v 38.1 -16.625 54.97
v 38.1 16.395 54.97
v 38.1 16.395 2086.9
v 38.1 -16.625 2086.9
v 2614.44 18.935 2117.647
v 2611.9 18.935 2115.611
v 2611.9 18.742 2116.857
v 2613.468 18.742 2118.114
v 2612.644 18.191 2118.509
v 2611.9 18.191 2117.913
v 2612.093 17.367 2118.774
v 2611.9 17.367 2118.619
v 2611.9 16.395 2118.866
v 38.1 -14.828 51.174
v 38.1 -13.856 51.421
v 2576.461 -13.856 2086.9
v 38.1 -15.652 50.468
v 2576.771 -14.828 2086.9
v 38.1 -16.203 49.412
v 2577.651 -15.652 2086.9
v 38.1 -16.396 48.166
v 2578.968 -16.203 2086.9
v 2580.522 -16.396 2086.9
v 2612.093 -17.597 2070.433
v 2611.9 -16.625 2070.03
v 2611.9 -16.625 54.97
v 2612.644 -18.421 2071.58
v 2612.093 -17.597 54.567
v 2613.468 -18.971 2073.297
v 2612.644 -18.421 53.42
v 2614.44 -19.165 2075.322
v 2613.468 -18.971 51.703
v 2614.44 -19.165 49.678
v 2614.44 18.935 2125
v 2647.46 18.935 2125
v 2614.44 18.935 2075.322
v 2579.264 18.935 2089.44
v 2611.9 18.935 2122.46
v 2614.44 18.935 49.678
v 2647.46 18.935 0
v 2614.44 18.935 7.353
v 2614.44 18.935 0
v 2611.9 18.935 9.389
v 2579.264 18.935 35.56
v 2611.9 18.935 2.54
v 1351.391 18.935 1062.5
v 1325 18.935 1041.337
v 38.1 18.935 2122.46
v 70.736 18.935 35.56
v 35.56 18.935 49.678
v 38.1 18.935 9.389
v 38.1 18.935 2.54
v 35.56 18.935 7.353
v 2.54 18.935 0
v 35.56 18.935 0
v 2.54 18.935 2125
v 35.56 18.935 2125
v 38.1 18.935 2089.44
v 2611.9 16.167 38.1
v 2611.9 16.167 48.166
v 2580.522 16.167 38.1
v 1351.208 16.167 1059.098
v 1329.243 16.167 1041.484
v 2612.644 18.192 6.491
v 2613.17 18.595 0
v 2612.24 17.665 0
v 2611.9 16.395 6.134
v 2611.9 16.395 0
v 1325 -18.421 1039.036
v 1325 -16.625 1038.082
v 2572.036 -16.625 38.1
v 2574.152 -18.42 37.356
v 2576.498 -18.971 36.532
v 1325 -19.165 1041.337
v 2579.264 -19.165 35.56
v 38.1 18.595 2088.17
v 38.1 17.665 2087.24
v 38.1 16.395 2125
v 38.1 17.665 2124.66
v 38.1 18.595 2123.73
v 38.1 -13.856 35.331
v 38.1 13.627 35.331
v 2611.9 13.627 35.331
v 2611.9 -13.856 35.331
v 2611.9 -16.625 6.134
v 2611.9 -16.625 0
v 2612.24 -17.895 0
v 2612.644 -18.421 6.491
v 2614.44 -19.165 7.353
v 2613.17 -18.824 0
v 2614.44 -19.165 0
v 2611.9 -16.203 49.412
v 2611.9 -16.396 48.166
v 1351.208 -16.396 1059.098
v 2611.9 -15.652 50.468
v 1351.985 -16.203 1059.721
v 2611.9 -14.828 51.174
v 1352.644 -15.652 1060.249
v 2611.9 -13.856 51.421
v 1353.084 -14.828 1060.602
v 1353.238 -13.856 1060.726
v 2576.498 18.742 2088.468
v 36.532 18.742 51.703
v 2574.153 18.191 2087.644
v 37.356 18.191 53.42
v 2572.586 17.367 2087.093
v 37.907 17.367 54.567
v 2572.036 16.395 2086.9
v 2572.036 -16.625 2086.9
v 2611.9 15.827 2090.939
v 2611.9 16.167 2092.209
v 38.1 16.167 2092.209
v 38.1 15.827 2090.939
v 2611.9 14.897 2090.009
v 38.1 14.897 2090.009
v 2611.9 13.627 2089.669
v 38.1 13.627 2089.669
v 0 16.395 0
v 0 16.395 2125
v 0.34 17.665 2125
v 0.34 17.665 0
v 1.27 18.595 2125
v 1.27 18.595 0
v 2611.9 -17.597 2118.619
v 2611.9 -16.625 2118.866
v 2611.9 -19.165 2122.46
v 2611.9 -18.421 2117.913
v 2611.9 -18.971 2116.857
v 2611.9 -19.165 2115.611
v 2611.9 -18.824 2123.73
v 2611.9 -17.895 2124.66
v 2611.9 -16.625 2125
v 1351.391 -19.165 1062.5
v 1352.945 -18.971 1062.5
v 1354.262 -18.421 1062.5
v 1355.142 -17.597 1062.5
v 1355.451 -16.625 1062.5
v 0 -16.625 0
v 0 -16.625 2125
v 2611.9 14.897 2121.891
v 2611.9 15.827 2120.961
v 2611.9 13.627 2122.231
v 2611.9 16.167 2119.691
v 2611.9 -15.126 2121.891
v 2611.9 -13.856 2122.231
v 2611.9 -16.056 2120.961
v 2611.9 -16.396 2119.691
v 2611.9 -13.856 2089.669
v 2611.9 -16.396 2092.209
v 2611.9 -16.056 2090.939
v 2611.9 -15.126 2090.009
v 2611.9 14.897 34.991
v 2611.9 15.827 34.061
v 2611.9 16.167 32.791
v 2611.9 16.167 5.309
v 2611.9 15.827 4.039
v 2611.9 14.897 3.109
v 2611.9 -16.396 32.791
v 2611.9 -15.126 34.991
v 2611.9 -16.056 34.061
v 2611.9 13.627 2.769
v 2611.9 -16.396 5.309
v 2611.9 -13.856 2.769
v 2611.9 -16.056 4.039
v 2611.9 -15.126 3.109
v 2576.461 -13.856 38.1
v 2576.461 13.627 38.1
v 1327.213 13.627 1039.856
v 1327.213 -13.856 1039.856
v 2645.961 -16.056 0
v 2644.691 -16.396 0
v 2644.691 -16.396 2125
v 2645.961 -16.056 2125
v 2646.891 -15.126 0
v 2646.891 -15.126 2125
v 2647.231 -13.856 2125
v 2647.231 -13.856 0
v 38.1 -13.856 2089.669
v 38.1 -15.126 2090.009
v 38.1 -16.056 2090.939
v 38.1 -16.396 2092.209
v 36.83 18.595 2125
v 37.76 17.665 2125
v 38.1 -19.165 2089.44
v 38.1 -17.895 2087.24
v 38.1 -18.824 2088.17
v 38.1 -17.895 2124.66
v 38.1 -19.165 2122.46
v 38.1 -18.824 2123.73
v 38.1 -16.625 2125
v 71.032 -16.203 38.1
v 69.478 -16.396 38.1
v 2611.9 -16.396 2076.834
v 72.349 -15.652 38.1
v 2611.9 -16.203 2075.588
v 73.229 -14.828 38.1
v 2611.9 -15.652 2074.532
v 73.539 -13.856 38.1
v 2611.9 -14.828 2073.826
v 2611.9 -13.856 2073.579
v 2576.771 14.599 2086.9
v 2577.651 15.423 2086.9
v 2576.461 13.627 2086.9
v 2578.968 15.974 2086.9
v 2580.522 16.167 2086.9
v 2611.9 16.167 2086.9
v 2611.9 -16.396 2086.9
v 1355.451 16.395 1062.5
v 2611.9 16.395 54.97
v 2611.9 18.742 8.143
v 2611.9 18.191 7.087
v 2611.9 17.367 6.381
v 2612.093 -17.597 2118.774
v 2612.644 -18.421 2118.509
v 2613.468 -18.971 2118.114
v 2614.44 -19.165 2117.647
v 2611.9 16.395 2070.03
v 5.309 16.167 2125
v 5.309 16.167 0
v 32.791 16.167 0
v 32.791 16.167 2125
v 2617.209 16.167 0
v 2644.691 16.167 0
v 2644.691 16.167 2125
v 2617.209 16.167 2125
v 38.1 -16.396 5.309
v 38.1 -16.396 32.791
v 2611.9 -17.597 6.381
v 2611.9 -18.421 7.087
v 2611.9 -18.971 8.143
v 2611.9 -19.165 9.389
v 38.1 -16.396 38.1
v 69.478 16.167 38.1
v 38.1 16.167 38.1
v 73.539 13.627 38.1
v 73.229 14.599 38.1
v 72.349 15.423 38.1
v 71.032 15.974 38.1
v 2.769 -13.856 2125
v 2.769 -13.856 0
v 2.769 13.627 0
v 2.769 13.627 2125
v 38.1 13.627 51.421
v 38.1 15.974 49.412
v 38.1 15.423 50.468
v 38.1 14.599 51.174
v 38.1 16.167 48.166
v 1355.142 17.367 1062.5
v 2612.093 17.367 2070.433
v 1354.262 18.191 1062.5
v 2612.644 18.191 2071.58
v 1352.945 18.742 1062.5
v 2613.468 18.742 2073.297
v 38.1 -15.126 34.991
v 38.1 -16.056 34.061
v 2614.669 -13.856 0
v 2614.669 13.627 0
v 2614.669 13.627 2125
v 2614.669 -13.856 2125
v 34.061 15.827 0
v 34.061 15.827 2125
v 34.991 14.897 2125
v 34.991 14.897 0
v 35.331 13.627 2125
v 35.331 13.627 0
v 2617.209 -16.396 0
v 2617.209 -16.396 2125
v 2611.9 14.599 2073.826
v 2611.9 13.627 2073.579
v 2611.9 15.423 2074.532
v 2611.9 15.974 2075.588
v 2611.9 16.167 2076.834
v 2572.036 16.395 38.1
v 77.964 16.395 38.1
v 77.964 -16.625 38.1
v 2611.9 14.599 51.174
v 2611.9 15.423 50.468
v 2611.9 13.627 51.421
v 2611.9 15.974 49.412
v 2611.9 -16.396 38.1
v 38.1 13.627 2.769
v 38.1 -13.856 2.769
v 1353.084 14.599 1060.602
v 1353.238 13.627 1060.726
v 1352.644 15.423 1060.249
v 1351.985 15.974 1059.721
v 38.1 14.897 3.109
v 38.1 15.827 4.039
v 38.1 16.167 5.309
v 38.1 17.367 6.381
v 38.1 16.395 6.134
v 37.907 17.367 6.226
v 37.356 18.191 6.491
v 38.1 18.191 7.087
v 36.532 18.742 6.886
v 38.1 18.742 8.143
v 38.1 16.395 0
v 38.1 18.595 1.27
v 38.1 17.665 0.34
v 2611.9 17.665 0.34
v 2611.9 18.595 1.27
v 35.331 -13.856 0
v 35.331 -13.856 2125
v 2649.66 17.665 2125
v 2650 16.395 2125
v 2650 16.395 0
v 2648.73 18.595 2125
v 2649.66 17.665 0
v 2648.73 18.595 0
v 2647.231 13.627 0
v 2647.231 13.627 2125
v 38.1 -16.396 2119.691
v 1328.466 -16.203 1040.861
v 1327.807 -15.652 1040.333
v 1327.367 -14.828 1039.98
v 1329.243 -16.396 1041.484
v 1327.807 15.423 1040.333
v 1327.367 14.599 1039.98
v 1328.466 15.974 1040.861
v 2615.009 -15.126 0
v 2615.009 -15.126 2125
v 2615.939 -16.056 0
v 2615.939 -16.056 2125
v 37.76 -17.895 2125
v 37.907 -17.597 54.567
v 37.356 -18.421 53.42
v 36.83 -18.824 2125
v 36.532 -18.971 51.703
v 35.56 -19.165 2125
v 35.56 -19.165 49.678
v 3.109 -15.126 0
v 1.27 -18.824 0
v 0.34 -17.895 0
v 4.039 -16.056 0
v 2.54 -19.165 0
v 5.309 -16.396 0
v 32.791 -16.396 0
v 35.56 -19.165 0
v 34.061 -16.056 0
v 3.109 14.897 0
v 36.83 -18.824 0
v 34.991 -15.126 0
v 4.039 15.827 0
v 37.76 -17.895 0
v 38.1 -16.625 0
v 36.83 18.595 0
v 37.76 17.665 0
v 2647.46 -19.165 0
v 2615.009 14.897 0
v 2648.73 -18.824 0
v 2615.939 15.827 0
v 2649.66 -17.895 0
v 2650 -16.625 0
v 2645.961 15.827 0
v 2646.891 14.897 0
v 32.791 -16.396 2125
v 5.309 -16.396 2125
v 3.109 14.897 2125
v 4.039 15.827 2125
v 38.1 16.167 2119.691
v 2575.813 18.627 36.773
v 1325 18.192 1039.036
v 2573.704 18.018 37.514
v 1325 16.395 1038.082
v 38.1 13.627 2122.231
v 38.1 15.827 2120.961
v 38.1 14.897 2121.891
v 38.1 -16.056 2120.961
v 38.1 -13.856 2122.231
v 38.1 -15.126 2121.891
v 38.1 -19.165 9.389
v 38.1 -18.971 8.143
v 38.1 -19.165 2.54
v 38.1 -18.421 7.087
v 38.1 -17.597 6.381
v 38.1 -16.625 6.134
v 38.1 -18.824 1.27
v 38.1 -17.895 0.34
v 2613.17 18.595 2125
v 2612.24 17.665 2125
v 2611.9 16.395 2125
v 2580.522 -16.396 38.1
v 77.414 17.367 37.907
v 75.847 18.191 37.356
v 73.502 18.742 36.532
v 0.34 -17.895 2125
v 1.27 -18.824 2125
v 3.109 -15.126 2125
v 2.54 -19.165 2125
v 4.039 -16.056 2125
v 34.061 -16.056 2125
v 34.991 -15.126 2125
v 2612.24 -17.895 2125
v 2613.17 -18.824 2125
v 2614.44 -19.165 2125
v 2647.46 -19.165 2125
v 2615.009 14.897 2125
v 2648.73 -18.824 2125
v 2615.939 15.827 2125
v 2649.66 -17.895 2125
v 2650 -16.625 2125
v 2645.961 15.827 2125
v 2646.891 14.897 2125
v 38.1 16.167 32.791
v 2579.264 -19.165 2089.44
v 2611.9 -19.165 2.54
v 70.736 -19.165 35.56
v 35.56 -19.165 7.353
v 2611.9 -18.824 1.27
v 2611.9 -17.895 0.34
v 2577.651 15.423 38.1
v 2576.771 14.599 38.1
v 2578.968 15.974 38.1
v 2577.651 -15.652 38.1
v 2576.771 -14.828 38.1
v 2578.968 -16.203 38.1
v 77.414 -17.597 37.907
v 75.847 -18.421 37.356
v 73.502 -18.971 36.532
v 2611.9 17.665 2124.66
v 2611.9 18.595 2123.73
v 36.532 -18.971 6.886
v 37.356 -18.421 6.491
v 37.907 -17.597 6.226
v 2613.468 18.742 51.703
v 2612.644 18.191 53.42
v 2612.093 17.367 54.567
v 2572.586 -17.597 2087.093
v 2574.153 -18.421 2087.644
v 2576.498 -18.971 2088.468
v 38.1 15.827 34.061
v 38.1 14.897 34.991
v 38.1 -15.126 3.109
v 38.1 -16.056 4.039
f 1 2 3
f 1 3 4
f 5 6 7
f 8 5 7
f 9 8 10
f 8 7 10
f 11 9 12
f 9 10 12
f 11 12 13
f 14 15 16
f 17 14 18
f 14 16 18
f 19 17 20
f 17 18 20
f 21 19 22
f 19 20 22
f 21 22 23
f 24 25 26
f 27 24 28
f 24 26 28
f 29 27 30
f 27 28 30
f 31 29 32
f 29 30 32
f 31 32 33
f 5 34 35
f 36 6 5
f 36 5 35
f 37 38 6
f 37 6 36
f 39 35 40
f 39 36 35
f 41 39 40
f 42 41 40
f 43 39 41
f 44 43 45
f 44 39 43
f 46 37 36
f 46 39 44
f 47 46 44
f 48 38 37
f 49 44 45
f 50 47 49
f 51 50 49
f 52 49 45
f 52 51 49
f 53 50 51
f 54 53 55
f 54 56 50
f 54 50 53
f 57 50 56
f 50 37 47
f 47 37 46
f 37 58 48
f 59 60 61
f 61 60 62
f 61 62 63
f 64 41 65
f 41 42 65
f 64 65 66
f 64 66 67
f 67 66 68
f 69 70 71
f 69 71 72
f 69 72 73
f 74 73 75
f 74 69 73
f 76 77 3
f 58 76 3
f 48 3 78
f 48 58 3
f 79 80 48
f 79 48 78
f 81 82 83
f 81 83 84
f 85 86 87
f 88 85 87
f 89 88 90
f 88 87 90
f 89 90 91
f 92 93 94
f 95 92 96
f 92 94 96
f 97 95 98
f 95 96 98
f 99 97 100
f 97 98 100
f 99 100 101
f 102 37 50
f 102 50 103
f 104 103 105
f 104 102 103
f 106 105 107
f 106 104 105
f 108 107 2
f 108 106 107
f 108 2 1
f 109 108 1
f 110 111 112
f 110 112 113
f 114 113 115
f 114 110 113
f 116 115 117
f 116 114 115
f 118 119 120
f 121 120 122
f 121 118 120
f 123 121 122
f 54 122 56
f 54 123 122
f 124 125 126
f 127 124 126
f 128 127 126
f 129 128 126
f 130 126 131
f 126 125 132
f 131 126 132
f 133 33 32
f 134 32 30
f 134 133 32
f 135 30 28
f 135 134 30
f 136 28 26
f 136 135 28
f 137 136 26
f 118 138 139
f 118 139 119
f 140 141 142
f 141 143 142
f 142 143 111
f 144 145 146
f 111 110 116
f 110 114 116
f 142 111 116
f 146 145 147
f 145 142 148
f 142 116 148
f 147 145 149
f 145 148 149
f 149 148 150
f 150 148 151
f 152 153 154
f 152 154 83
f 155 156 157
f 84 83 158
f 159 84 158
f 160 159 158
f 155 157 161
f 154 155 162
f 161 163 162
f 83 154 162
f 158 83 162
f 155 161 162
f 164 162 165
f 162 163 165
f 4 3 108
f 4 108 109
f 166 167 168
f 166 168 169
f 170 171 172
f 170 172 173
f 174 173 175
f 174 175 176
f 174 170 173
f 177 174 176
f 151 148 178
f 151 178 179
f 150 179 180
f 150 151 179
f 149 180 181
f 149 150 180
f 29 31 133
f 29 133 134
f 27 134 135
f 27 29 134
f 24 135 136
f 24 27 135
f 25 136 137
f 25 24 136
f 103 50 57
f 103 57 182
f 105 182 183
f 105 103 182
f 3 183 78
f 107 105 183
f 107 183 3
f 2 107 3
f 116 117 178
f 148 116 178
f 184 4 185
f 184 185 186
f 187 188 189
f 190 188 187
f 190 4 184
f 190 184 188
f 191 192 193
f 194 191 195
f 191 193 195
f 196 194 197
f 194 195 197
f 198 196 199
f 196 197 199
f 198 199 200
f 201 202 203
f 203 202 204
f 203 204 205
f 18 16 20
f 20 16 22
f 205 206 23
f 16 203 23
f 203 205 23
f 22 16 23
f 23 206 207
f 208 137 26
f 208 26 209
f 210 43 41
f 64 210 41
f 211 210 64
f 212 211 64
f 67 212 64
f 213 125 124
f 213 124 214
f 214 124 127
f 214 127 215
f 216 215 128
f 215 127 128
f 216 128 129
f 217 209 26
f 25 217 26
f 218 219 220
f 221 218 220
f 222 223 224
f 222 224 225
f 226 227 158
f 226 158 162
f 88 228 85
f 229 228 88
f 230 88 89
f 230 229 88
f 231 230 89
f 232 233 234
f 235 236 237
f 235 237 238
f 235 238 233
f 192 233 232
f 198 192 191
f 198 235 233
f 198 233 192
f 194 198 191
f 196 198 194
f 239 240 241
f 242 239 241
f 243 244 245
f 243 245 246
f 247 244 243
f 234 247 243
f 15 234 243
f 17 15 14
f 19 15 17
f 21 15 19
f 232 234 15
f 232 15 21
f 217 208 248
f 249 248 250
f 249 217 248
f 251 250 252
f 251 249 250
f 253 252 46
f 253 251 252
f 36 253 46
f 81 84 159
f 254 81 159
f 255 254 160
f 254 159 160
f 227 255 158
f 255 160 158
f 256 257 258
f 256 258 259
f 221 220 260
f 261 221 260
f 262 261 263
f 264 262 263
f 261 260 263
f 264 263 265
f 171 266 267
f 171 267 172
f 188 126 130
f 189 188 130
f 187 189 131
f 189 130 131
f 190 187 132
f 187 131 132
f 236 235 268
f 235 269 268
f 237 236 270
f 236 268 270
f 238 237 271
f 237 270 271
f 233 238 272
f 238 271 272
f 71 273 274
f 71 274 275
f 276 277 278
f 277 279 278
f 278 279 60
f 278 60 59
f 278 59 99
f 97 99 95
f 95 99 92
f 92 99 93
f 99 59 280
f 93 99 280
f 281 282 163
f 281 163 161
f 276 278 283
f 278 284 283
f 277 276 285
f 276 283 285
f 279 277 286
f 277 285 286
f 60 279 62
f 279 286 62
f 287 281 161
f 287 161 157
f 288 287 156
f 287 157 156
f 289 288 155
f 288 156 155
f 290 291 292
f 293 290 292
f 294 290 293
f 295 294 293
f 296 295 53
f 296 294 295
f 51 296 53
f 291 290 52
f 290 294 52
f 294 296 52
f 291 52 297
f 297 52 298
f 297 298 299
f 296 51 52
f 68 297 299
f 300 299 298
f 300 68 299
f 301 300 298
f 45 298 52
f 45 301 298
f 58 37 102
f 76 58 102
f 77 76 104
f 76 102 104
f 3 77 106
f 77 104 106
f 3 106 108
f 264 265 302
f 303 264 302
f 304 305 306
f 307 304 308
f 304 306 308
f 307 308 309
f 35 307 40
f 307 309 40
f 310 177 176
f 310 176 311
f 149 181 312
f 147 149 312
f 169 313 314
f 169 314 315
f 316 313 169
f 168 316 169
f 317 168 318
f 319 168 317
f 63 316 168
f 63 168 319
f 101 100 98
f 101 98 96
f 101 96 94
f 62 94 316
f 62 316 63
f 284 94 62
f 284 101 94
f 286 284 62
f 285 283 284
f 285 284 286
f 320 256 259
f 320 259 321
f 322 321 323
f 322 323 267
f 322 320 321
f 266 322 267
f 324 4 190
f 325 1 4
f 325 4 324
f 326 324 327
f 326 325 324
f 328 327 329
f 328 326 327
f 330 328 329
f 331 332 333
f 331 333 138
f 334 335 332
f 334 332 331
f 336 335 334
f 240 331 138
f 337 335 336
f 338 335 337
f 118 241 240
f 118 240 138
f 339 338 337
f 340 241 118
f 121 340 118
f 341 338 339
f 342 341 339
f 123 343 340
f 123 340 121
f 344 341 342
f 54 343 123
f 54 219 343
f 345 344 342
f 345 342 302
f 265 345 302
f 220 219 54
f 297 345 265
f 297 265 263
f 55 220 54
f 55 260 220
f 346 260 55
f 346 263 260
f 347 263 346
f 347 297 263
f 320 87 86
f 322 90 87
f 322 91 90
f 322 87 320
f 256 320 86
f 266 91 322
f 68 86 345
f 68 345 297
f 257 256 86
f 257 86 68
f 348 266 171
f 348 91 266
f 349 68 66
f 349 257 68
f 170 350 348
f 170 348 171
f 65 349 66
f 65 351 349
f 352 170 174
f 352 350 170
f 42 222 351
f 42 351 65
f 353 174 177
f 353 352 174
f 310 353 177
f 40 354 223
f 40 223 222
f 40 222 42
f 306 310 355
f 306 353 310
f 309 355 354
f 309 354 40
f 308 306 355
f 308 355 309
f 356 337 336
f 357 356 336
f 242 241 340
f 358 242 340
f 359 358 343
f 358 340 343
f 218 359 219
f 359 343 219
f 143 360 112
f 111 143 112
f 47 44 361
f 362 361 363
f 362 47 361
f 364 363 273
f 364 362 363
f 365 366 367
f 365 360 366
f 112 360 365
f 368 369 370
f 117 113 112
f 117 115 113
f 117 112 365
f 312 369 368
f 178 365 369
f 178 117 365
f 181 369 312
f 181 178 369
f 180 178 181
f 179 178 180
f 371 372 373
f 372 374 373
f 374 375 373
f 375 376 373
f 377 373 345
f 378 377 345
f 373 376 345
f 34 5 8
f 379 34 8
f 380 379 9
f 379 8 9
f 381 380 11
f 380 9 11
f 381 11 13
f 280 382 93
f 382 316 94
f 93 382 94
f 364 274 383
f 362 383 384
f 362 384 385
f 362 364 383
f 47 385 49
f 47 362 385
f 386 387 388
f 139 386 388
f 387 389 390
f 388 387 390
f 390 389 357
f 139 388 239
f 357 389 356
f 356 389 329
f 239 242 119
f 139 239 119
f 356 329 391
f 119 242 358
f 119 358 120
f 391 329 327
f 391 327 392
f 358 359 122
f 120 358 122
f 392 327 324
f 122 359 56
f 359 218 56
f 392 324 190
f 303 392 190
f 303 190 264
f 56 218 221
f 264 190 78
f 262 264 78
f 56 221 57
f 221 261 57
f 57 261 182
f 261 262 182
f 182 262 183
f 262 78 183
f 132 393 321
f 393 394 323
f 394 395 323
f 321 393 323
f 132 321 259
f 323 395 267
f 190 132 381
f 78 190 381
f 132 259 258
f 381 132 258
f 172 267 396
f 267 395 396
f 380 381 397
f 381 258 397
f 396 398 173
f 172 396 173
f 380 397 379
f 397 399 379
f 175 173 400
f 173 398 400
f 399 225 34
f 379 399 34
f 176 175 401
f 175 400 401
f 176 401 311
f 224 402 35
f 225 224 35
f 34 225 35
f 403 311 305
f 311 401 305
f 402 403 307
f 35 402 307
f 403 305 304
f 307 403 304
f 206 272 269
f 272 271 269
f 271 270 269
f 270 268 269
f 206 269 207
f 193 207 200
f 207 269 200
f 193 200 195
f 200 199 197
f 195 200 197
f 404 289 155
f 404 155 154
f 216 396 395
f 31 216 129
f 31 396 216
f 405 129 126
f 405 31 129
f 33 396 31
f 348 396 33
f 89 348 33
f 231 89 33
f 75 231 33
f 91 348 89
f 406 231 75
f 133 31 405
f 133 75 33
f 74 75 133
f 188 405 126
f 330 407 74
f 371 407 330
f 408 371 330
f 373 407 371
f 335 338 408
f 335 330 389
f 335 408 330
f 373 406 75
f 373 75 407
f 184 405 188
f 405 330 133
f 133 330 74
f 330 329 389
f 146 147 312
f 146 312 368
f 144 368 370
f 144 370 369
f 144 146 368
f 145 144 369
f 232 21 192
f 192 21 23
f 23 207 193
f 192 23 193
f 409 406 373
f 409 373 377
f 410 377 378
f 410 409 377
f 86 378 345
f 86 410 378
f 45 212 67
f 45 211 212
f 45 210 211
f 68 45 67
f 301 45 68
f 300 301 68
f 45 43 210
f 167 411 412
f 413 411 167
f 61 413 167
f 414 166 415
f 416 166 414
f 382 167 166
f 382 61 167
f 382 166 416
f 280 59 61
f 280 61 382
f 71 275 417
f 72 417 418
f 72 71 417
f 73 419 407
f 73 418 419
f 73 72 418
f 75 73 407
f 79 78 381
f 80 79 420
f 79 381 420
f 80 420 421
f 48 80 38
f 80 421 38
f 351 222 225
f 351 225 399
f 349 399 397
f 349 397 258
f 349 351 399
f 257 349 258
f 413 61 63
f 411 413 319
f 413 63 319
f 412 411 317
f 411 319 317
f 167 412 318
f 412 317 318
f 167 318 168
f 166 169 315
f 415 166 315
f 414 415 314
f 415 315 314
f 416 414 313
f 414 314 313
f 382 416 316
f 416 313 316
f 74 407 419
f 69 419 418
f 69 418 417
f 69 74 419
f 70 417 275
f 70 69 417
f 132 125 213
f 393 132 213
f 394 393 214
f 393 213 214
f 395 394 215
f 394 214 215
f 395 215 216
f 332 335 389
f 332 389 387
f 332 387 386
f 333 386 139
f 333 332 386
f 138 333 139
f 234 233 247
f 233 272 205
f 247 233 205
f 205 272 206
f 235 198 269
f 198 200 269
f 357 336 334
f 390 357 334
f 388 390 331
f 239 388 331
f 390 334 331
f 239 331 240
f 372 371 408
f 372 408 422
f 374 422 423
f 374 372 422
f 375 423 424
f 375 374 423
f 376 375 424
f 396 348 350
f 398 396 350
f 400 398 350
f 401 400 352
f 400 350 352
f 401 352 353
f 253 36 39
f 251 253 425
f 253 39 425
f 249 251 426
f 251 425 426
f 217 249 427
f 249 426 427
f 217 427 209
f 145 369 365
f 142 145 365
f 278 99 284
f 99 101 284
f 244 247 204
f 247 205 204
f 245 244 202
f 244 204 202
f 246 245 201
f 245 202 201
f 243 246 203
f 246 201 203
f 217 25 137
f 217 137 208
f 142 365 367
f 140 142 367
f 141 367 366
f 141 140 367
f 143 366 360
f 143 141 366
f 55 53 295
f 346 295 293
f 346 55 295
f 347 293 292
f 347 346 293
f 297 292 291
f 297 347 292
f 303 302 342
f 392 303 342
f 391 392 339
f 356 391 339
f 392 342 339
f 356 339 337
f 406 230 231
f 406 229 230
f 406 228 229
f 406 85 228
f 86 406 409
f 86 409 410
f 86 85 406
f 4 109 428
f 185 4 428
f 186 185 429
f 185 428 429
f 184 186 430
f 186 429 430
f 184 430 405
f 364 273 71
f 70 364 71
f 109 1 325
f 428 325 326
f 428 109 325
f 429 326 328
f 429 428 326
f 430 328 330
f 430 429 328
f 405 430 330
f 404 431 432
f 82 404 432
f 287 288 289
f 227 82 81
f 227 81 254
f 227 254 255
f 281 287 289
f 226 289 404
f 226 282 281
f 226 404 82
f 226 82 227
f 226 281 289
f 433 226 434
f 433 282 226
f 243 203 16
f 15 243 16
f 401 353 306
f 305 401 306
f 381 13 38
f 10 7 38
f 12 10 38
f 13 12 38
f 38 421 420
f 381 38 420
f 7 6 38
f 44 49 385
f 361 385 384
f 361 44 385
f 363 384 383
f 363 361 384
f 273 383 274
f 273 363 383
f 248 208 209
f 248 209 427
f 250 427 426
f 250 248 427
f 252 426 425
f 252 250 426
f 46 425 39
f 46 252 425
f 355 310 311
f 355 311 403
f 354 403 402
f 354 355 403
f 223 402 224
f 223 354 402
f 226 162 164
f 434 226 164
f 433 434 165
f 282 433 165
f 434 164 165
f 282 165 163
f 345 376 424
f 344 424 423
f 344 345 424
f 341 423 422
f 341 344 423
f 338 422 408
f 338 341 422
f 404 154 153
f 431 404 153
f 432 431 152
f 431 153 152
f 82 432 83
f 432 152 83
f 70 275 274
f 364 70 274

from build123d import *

# Parameters (mm, degrees)
BOSS_EXTRUDE1_DEPTH             = 2125
BOSS_EXTRUDE2_DEPTH             = 2573.8
BOSS_EXTRUDE5_REACH             = 1700.499
BOSS_EXTRUDE5_DIRECTION_2_REACH = 1700.499
BOSS_EXTRUDE7_REACH             = 3326.514
BOSS_EXTRUDE7_DIRECTION_2_REACH = 3326.514


with BuildPart() as part:
    # Sketch2 → Boss-Extrude1 (new body)
    with BuildSketch(Plane.XY):
        with BuildLine():
            Line((2.54, 18.93544774), (35.56, 18.93544774))
            ThreePointArc((35.56, 18.93544774), (37.356051224, 18.191498964), (38.1, 16.39544774))
            Line((38.1, 16.39544774), (38.1, -16.62455226))
            ThreePointArc((38.1, -16.62455226), (37.356051224, -18.420603484), (35.56, -19.16455226))
            Line((35.56, -19.16455226), (2.54, -19.16455226))
            ThreePointArc((2.54, -19.16455226), (0.743948776, -18.420603484), (0, -16.62455226))
            Line((0, -16.62455226), (0, 16.39544774))
            ThreePointArc((0, 16.39544774), (0.743948776, 18.191498964), (2.54, 18.93544774))
        make_face()
        with BuildLine():
            Line((5.3086, 16.16684774), (32.7914, 16.16684774))
            ThreePointArc((32.7914, 16.16684774), (34.587451224, 15.422898964), (35.3314, 13.62684774))
            Line((35.3314, 13.62684774), (35.3314, -13.85595226))
            ThreePointArc((35.3314, -13.85595226), (34.587451224, -15.652003484), (32.7914, -16.39595226))
            Line((32.7914, -16.39595226), (5.3086, -16.39595226))
            ThreePointArc((5.3086, -16.39595226), (3.512548776, -15.652003484), (2.7686, -13.85595226))
            Line((2.7686, -13.85595226), (2.7686, 13.62684774))
            ThreePointArc((2.7686, 13.62684774), (3.512548776, 15.422898964), (5.3086, 16.16684774))
        make_face(mode=Mode.SUBTRACT)
    extrude(amount=BOSS_EXTRUDE1_DEPTH)


with BuildPart() as body_2:
    # Mirror2: mirrored copy
    add(part.part.mirror(Plane.ZY.offset(-1325)))


with BuildPart() as part_1:
    add(part.part)

    add(body_2.part)  # Boss-Extrude2 merges body 2
    # Sketch3 → Boss-Extrude2 (add)
    with BuildSketch(Plane.ZY.offset(-2611.9)):
        with BuildLine():
            Line((2.54, 18.93544774), (35.56, 18.93544774))
            ThreePointArc((35.56, 18.93544774), (37.356051224, 18.191498964), (38.1, 16.39544774))
            Line((38.1, 16.39544774), (38.1, -16.62455226))
            ThreePointArc((38.1, -16.62455226), (37.356051224, -18.420603484), (35.56, -19.16455226))
            Line((35.56, -19.16455226), (2.54, -19.16455226))
            ThreePointArc((2.54, -19.16455226), (0.743948776, -18.420603484), (0, -16.62455226))
            Line((0, -16.62455226), (0, 16.39544774))
            ThreePointArc((0, 16.39544774), (0.743948776, 18.191498964), (2.54, 18.93544774))
        make_face()
        with BuildLine():
            Line((5.3086, 16.16684774), (32.7914, 16.16684774))
            ThreePointArc((32.7914, 16.16684774), (34.587451224, 15.422898964), (35.3314, 13.62684774))
            Line((35.3314, 13.62684774), (35.3314, -13.85595226))
            ThreePointArc((35.3314, -13.85595226), (34.587451224, -15.652003484), (32.7914, -16.39595226))
            Line((32.7914, -16.39595226), (5.3086, -16.39595226))
            ThreePointArc((5.3086, -16.39595226), (3.512548776, -15.652003484), (2.7686, -13.85595226))
            Line((2.7686, -13.85595226), (2.7686, 13.62684774))
            ThreePointArc((2.7686, 13.62684774), (3.512548776, 15.422898964), (5.3086, 16.16684774))
        make_face(mode=Mode.SUBTRACT)
    boss_extrude2 = extrude(amount=BOSS_EXTRUDE2_DEPTH)

    # Mirror3: Boss-Extrude2 across plane
    add(boss_extrude2.mirror(Plane.XY.offset(1062.5)))

    # Sketch8 → Boss-Extrude5 (add, up to next)
    with BuildSketch(Plane(origin=(1325, 0, 1062.5), x_dir=(-0.6255921846507733, 0, 0.7801502537997875), z_dir=(-0.7801502537997875, 0, -0.6255921846507733)), mode=Mode.PRIVATE) as boss_extrude5_sk1:
        with BuildLine():
            Line((-16.51, 18.93544774), (16.51, 18.93544774))
            ThreePointArc((16.51, 18.93544774), (18.306051224, 18.191498964), (19.05, 16.39544774))
            Line((19.05, 16.39544774), (19.05, -16.62455226))
            ThreePointArc((19.05, -16.62455226), (18.306051224, -18.420603484), (16.51, -19.16455226))
            Line((16.51, -19.16455226), (-16.51, -19.16455226))
            ThreePointArc((-16.51, -19.16455226), (-18.306051224, -18.420603484), (-19.05, -16.62455226))
            Line((-19.05, -16.62455226), (-19.05, 16.39544774))
            ThreePointArc((-19.05, 16.39544774), (-18.306051224, 18.191498964), (-16.51, 18.93544774))
        make_face()
        with BuildLine():
            Line((16.2814, 13.62684774), (16.2814, -13.85595226))
            ThreePointArc((16.2814, -13.85595226), (15.537451224, -15.652003484), (13.7414, -16.39595226))
            Line((13.7414, -16.39595226), (-13.7414, -16.39595226))
            ThreePointArc((-13.7414, -16.39595226), (-15.537451224, -15.652003484), (-16.2814, -13.85595226))
            Line((-16.2814, -13.85595226), (-16.2814, 13.62684774))
            ThreePointArc((-16.2814, 13.62684774), (-15.537451224, 15.422898964), (-13.7414, 16.16684774))
            Line((-13.7414, 16.16684774), (13.7414, 16.16684774))
            ThreePointArc((13.7414, 16.16684774), (15.537451224, 15.422898964), (16.2814, 13.62684774))
        make_face(mode=Mode.SUBTRACT)
    boss_extrude5_tool1 = extrude(boss_extrude5_sk1.sketch, amount=-BOSS_EXTRUDE5_REACH, mode=Mode.PRIVATE) - part_1.part
    add(boss_extrude5_tool1.solids().sort_by_distance((1336.213772, 17.810499, 1048.515767))[0])

    # Sketch8 → Boss-Extrude5 direction 2 (add, up to next)
    with BuildSketch(Plane(origin=(1325, 0, 1062.5), x_dir=(-0.6255921846507733, 0, 0.7801502537997875), z_dir=(-0.7801502537997875, 0, -0.6255921846507733)), mode=Mode.PRIVATE) as boss_extrude5_direction_2_sk1:
        with BuildLine():
            Line((-16.51, 18.93544774), (16.51, 18.93544774))
            ThreePointArc((16.51, 18.93544774), (18.306051224, 18.191498964), (19.05, 16.39544774))
            Line((19.05, 16.39544774), (19.05, -16.62455226))
            ThreePointArc((19.05, -16.62455226), (18.306051224, -18.420603484), (16.51, -19.16455226))
            Line((16.51, -19.16455226), (-16.51, -19.16455226))
            ThreePointArc((-16.51, -19.16455226), (-18.306051224, -18.420603484), (-19.05, -16.62455226))
            Line((-19.05, -16.62455226), (-19.05, 16.39544774))
            ThreePointArc((-19.05, 16.39544774), (-18.306051224, 18.191498964), (-16.51, 18.93544774))
        make_face()
        with BuildLine():
            Line((16.2814, 13.62684774), (16.2814, -13.85595226))
            ThreePointArc((16.2814, -13.85595226), (15.537451224, -15.652003484), (13.7414, -16.39595226))
            Line((13.7414, -16.39595226), (-13.7414, -16.39595226))
            ThreePointArc((-13.7414, -16.39595226), (-15.537451224, -15.652003484), (-16.2814, -13.85595226))
            Line((-16.2814, -13.85595226), (-16.2814, 13.62684774))
            ThreePointArc((-16.2814, 13.62684774), (-15.537451224, 15.422898964), (-13.7414, 16.16684774))
            Line((-13.7414, 16.16684774), (13.7414, 16.16684774))
            ThreePointArc((13.7414, 16.16684774), (15.537451224, 15.422898964), (16.2814, 13.62684774))
        make_face(mode=Mode.SUBTRACT)
    boss_extrude5_direction_2_tool1 = extrude(boss_extrude5_direction_2_sk1.sketch, amount=BOSS_EXTRUDE5_DIRECTION_2_REACH, mode=Mode.PRIVATE) - part_1.part
    add(boss_extrude5_direction_2_tool1.solids().sort_by_distance((1336.213772, 17.810499, 1048.515767))[0])

    # Sketch11 → Boss-Extrude7 (add, up to next)
    with BuildSketch(Plane(origin=(386.960291268, 0, -310.298346771), x_dir=(-0.6255921846507708, 0, -0.7801502537997894), z_dir=(0.7801502537997894, 0, -0.6255921846507708)), mode=Mode.PRIVATE) as boss_extrude7_sk1:
        with BuildLine():
            Line((-1674.329289325, 18.93544774), (-1641.309289325, 18.93544774))
            ThreePointArc((-1641.309289325, 18.93544774), (-1639.5132381, 18.191498964), (-1638.769289325, 16.39544774))
            Line((-1638.769289325, 16.39544774), (-1638.769289325, -16.62455226))
            ThreePointArc((-1638.769289325, -16.62455226), (-1639.5132381, -18.420603484), (-1641.309289325, -19.16455226))
            Line((-1641.309289325, -19.16455226), (-1674.329289325, -19.16455226))
            ThreePointArc((-1674.329289325, -19.16455226), (-1676.125340549, -18.420603484), (-1676.869289325, -16.62455226))
            Line((-1676.869289325, -16.62455226), (-1676.869289325, 16.39544774))
            ThreePointArc((-1676.869289325, 16.39544774), (-1676.125340549, 18.191498964), (-1674.329289325, 18.93544774))
        make_face()
        with BuildLine():
            Line((-1671.560689325, 16.16684774), (-1644.077889325, 16.16684774))
            ThreePointArc((-1644.077889325, 16.16684774), (-1642.2818381, 15.422898964), (-1641.537889325, 13.62684774))
            Line((-1641.537889325, 13.62684774), (-1641.537889325, -13.85595226))
            ThreePointArc((-1641.537889325, -13.85595226), (-1642.2818381, -15.652003484), (-1644.077889325, -16.39595226))
            Line((-1644.077889325, -16.39595226), (-1671.560689325, -16.39595226))
            ThreePointArc((-1671.560689325, -16.39595226), (-1673.356740549, -15.652003484), (-1674.100689325, -13.85595226))
            Line((-1674.100689325, -13.85595226), (-1674.100689325, 13.62684774))
            ThreePointArc((-1674.100689325, 13.62684774), (-1673.356740549, 15.422898964), (-1671.560689325, 16.16684774))
        make_face(mode=Mode.SUBTRACT)
    boss_extrude7_tool1 = extrude(boss_extrude7_sk1.sketch, amount=-BOSS_EXTRUDE7_REACH, mode=Mode.PRIVATE) - part_1.part
    add(boss_extrude7_tool1.solids().sort_by_distance((1424.079082, 18.396632, 983.049793))[0])

    # Sketch11 → Boss-Extrude7 direction 2 (add, up to next)
    with BuildSketch(Plane(origin=(386.960291268, 0, -310.298346771), x_dir=(-0.6255921846507708, 0, -0.7801502537997894), z_dir=(0.7801502537997894, 0, -0.6255921846507708)), mode=Mode.PRIVATE) as boss_extrude7_direction_2_sk1:
        with BuildLine():
            Line((-1674.329289325, 18.93544774), (-1641.309289325, 18.93544774))
            ThreePointArc((-1641.309289325, 18.93544774), (-1639.5132381, 18.191498964), (-1638.769289325, 16.39544774))
            Line((-1638.769289325, 16.39544774), (-1638.769289325, -16.62455226))
            ThreePointArc((-1638.769289325, -16.62455226), (-1639.5132381, -18.420603484), (-1641.309289325, -19.16455226))
            Line((-1641.309289325, -19.16455226), (-1674.329289325, -19.16455226))
            ThreePointArc((-1674.329289325, -19.16455226), (-1676.125340549, -18.420603484), (-1676.869289325, -16.62455226))
            Line((-1676.869289325, -16.62455226), (-1676.869289325, 16.39544774))
            ThreePointArc((-1676.869289325, 16.39544774), (-1676.125340549, 18.191498964), (-1674.329289325, 18.93544774))
        make_face()
        with BuildLine():
            Line((-1671.560689325, 16.16684774), (-1644.077889325, 16.16684774))
            ThreePointArc((-1644.077889325, 16.16684774), (-1642.2818381, 15.422898964), (-1641.537889325, 13.62684774))
            Line((-1641.537889325, 13.62684774), (-1641.537889325, -13.85595226))
            ThreePointArc((-1641.537889325, -13.85595226), (-1642.2818381, -15.652003484), (-1644.077889325, -16.39595226))
            Line((-1644.077889325, -16.39595226), (-1671.560689325, -16.39595226))
            ThreePointArc((-1671.560689325, -16.39595226), (-1673.356740549, -15.652003484), (-1674.100689325, -13.85595226))
            Line((-1674.100689325, -13.85595226), (-1674.100689325, 13.62684774))
            ThreePointArc((-1674.100689325, 13.62684774), (-1673.356740549, 15.422898964), (-1671.560689325, 16.16684774))
        make_face(mode=Mode.SUBTRACT)
    boss_extrude7_direction_2_tool1 = extrude(boss_extrude7_direction_2_sk1.sketch, amount=BOSS_EXTRUDE7_DIRECTION_2_REACH, mode=Mode.PRIVATE) - part_1.part
    add(boss_extrude7_direction_2_tool1.solids().sort_by_distance((1424.079082, 18.396632, 983.049793))[0])


solid = part_1.part
